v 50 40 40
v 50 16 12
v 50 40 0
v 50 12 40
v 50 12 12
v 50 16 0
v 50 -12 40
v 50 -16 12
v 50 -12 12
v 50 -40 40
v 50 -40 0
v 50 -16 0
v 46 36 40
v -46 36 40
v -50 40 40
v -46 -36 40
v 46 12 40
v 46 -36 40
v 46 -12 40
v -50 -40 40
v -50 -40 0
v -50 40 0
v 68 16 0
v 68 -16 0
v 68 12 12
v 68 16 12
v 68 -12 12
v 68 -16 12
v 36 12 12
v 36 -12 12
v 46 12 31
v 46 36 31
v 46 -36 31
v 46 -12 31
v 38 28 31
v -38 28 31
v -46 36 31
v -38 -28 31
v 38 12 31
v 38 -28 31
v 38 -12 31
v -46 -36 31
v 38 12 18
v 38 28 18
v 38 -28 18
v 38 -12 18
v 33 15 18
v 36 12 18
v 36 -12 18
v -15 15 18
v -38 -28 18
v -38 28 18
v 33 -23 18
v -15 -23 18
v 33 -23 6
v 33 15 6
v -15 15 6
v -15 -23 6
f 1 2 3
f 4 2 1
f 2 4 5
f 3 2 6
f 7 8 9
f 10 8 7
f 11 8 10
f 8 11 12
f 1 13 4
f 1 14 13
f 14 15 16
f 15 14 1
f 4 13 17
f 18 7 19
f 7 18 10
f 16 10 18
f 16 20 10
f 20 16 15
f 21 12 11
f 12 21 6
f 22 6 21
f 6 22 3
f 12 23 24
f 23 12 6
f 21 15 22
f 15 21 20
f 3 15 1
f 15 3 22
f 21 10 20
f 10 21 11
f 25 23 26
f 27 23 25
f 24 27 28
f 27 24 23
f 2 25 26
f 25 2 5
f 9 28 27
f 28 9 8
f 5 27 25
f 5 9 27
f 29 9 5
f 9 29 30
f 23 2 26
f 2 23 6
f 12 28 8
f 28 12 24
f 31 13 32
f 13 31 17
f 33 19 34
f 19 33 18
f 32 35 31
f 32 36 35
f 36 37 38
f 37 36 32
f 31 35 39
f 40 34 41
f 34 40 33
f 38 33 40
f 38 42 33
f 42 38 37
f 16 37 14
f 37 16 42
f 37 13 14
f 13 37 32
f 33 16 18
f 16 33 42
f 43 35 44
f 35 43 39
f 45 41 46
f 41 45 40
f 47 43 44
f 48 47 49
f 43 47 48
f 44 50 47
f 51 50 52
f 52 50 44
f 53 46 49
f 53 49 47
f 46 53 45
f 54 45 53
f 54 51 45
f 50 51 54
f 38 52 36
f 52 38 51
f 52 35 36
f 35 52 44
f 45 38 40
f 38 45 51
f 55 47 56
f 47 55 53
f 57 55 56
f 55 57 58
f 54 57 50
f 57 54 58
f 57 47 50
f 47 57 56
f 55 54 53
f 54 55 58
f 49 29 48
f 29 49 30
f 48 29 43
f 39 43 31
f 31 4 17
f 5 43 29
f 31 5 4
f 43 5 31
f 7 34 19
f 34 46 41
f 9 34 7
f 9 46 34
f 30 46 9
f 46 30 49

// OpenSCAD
// Parameters (mm)
body_width = 100;
body_depth = 80;
body_height = 40;

rim_thickness = 4;
upper_recess_depth = 9;

middle_inset_x = 8;
middle_inset_y = 8;
middle_recess_depth = 22;

deep_pocket_width = 48;
deep_pocket_depth = 38;
deep_pocket_offset_x = 9;
deep_pocket_offset_y = -4;
bottom_thickness = 6;

projection_length = 18;
projection_width = 32;
projection_height = 12;
projection_offset_y = 0;

side_recess_width = 24;
side_recess_inset = 14;

join_overlap = 0.2;
epsilon = 0.01;

// Derived dimensions
upper_width = body_width - 2 * rim_thickness;
upper_depth = body_depth - 2 * rim_thickness;
middle_width = upper_width - 2 * middle_inset_x;
middle_depth = upper_depth - 2 * middle_inset_y;

upper_floor = body_height - upper_recess_depth;
middle_floor = body_height - middle_recess_depth;
deep_floor = bottom_thickness;
side_floor = projection_height;

// Parameter checks
assert(rim_thickness > 0 && bottom_thickness > 0);
assert(upper_width > 0 && upper_depth > 0);
assert(middle_width > 0 && middle_depth > 0);
assert(middle_inset_x > 0 && middle_inset_y > 0);
assert(body_height > upper_floor &&
       upper_floor > middle_floor &&
       middle_floor > deep_floor);
assert(deep_pocket_width > 0 && deep_pocket_depth > 0);
assert(abs(deep_pocket_offset_x) + deep_pocket_width / 2
       < middle_width / 2);
assert(abs(deep_pocket_offset_y) + deep_pocket_depth / 2
       < middle_depth / 2);
assert(side_floor > deep_floor && side_floor < middle_floor);
assert(projection_length > 0 && join_overlap > epsilon);
assert(projection_width > side_recess_width && side_recess_width > 0);
assert(abs(projection_offset_y) + projection_width / 2 < body_depth / 2);
assert(side_recess_inset > (body_width - middle_width) / 2 &&
       side_recess_inset < body_width / 2);

// Bottom-aligned rectangular solid
module rectangular_solid(width, depth, height) {
    translate([-width / 2, -depth / 2, 0])
        cube([width, depth, height]);
}

// Top-opening rectangular cut
module pocket_cut(width, depth, floor_z, offset_x = 0, offset_y = 0) {
    translate([offset_x - width / 2,
               offset_y - depth / 2,
               floor_z])
        cube([width, depth, body_height - floor_z + epsilon]);
}

// Joined projection on the right side
module side_projection() {
    translate([body_width / 2 - join_overlap,
               projection_offset_y - projection_width / 2,
               0])
        cube([projection_length + join_overlap,
              projection_width,
              projection_height]);
}

// Side opening above the projection
module side_recess() {
    translate([body_width / 2 - side_recess_inset,
               projection_offset_y - side_recess_width / 2,
               side_floor])
        cube([side_recess_inset + projection_length + epsilon,
              side_recess_width,
              body_height - side_floor + epsilon]);
}

// Stepped cavity body
module stepped_body() {
    difference() {
        union() {
            rectangular_solid(body_width, body_depth, body_height);
            side_projection();
        }

        // Broad upper recess and thin rim
        pocket_cut(upper_width, upper_depth, upper_floor);

        // Inset intermediate recess
        pocket_cut(middle_width, middle_depth, middle_floor);

        // Offset deepest pocket with solid bottom
        pocket_cut(deep_pocket_width, deep_pocket_depth, deep_floor,
                   deep_pocket_offset_x, deep_pocket_offset_y);

        // Additional side tier
        side_recess();
    }
}

stepped_body();
